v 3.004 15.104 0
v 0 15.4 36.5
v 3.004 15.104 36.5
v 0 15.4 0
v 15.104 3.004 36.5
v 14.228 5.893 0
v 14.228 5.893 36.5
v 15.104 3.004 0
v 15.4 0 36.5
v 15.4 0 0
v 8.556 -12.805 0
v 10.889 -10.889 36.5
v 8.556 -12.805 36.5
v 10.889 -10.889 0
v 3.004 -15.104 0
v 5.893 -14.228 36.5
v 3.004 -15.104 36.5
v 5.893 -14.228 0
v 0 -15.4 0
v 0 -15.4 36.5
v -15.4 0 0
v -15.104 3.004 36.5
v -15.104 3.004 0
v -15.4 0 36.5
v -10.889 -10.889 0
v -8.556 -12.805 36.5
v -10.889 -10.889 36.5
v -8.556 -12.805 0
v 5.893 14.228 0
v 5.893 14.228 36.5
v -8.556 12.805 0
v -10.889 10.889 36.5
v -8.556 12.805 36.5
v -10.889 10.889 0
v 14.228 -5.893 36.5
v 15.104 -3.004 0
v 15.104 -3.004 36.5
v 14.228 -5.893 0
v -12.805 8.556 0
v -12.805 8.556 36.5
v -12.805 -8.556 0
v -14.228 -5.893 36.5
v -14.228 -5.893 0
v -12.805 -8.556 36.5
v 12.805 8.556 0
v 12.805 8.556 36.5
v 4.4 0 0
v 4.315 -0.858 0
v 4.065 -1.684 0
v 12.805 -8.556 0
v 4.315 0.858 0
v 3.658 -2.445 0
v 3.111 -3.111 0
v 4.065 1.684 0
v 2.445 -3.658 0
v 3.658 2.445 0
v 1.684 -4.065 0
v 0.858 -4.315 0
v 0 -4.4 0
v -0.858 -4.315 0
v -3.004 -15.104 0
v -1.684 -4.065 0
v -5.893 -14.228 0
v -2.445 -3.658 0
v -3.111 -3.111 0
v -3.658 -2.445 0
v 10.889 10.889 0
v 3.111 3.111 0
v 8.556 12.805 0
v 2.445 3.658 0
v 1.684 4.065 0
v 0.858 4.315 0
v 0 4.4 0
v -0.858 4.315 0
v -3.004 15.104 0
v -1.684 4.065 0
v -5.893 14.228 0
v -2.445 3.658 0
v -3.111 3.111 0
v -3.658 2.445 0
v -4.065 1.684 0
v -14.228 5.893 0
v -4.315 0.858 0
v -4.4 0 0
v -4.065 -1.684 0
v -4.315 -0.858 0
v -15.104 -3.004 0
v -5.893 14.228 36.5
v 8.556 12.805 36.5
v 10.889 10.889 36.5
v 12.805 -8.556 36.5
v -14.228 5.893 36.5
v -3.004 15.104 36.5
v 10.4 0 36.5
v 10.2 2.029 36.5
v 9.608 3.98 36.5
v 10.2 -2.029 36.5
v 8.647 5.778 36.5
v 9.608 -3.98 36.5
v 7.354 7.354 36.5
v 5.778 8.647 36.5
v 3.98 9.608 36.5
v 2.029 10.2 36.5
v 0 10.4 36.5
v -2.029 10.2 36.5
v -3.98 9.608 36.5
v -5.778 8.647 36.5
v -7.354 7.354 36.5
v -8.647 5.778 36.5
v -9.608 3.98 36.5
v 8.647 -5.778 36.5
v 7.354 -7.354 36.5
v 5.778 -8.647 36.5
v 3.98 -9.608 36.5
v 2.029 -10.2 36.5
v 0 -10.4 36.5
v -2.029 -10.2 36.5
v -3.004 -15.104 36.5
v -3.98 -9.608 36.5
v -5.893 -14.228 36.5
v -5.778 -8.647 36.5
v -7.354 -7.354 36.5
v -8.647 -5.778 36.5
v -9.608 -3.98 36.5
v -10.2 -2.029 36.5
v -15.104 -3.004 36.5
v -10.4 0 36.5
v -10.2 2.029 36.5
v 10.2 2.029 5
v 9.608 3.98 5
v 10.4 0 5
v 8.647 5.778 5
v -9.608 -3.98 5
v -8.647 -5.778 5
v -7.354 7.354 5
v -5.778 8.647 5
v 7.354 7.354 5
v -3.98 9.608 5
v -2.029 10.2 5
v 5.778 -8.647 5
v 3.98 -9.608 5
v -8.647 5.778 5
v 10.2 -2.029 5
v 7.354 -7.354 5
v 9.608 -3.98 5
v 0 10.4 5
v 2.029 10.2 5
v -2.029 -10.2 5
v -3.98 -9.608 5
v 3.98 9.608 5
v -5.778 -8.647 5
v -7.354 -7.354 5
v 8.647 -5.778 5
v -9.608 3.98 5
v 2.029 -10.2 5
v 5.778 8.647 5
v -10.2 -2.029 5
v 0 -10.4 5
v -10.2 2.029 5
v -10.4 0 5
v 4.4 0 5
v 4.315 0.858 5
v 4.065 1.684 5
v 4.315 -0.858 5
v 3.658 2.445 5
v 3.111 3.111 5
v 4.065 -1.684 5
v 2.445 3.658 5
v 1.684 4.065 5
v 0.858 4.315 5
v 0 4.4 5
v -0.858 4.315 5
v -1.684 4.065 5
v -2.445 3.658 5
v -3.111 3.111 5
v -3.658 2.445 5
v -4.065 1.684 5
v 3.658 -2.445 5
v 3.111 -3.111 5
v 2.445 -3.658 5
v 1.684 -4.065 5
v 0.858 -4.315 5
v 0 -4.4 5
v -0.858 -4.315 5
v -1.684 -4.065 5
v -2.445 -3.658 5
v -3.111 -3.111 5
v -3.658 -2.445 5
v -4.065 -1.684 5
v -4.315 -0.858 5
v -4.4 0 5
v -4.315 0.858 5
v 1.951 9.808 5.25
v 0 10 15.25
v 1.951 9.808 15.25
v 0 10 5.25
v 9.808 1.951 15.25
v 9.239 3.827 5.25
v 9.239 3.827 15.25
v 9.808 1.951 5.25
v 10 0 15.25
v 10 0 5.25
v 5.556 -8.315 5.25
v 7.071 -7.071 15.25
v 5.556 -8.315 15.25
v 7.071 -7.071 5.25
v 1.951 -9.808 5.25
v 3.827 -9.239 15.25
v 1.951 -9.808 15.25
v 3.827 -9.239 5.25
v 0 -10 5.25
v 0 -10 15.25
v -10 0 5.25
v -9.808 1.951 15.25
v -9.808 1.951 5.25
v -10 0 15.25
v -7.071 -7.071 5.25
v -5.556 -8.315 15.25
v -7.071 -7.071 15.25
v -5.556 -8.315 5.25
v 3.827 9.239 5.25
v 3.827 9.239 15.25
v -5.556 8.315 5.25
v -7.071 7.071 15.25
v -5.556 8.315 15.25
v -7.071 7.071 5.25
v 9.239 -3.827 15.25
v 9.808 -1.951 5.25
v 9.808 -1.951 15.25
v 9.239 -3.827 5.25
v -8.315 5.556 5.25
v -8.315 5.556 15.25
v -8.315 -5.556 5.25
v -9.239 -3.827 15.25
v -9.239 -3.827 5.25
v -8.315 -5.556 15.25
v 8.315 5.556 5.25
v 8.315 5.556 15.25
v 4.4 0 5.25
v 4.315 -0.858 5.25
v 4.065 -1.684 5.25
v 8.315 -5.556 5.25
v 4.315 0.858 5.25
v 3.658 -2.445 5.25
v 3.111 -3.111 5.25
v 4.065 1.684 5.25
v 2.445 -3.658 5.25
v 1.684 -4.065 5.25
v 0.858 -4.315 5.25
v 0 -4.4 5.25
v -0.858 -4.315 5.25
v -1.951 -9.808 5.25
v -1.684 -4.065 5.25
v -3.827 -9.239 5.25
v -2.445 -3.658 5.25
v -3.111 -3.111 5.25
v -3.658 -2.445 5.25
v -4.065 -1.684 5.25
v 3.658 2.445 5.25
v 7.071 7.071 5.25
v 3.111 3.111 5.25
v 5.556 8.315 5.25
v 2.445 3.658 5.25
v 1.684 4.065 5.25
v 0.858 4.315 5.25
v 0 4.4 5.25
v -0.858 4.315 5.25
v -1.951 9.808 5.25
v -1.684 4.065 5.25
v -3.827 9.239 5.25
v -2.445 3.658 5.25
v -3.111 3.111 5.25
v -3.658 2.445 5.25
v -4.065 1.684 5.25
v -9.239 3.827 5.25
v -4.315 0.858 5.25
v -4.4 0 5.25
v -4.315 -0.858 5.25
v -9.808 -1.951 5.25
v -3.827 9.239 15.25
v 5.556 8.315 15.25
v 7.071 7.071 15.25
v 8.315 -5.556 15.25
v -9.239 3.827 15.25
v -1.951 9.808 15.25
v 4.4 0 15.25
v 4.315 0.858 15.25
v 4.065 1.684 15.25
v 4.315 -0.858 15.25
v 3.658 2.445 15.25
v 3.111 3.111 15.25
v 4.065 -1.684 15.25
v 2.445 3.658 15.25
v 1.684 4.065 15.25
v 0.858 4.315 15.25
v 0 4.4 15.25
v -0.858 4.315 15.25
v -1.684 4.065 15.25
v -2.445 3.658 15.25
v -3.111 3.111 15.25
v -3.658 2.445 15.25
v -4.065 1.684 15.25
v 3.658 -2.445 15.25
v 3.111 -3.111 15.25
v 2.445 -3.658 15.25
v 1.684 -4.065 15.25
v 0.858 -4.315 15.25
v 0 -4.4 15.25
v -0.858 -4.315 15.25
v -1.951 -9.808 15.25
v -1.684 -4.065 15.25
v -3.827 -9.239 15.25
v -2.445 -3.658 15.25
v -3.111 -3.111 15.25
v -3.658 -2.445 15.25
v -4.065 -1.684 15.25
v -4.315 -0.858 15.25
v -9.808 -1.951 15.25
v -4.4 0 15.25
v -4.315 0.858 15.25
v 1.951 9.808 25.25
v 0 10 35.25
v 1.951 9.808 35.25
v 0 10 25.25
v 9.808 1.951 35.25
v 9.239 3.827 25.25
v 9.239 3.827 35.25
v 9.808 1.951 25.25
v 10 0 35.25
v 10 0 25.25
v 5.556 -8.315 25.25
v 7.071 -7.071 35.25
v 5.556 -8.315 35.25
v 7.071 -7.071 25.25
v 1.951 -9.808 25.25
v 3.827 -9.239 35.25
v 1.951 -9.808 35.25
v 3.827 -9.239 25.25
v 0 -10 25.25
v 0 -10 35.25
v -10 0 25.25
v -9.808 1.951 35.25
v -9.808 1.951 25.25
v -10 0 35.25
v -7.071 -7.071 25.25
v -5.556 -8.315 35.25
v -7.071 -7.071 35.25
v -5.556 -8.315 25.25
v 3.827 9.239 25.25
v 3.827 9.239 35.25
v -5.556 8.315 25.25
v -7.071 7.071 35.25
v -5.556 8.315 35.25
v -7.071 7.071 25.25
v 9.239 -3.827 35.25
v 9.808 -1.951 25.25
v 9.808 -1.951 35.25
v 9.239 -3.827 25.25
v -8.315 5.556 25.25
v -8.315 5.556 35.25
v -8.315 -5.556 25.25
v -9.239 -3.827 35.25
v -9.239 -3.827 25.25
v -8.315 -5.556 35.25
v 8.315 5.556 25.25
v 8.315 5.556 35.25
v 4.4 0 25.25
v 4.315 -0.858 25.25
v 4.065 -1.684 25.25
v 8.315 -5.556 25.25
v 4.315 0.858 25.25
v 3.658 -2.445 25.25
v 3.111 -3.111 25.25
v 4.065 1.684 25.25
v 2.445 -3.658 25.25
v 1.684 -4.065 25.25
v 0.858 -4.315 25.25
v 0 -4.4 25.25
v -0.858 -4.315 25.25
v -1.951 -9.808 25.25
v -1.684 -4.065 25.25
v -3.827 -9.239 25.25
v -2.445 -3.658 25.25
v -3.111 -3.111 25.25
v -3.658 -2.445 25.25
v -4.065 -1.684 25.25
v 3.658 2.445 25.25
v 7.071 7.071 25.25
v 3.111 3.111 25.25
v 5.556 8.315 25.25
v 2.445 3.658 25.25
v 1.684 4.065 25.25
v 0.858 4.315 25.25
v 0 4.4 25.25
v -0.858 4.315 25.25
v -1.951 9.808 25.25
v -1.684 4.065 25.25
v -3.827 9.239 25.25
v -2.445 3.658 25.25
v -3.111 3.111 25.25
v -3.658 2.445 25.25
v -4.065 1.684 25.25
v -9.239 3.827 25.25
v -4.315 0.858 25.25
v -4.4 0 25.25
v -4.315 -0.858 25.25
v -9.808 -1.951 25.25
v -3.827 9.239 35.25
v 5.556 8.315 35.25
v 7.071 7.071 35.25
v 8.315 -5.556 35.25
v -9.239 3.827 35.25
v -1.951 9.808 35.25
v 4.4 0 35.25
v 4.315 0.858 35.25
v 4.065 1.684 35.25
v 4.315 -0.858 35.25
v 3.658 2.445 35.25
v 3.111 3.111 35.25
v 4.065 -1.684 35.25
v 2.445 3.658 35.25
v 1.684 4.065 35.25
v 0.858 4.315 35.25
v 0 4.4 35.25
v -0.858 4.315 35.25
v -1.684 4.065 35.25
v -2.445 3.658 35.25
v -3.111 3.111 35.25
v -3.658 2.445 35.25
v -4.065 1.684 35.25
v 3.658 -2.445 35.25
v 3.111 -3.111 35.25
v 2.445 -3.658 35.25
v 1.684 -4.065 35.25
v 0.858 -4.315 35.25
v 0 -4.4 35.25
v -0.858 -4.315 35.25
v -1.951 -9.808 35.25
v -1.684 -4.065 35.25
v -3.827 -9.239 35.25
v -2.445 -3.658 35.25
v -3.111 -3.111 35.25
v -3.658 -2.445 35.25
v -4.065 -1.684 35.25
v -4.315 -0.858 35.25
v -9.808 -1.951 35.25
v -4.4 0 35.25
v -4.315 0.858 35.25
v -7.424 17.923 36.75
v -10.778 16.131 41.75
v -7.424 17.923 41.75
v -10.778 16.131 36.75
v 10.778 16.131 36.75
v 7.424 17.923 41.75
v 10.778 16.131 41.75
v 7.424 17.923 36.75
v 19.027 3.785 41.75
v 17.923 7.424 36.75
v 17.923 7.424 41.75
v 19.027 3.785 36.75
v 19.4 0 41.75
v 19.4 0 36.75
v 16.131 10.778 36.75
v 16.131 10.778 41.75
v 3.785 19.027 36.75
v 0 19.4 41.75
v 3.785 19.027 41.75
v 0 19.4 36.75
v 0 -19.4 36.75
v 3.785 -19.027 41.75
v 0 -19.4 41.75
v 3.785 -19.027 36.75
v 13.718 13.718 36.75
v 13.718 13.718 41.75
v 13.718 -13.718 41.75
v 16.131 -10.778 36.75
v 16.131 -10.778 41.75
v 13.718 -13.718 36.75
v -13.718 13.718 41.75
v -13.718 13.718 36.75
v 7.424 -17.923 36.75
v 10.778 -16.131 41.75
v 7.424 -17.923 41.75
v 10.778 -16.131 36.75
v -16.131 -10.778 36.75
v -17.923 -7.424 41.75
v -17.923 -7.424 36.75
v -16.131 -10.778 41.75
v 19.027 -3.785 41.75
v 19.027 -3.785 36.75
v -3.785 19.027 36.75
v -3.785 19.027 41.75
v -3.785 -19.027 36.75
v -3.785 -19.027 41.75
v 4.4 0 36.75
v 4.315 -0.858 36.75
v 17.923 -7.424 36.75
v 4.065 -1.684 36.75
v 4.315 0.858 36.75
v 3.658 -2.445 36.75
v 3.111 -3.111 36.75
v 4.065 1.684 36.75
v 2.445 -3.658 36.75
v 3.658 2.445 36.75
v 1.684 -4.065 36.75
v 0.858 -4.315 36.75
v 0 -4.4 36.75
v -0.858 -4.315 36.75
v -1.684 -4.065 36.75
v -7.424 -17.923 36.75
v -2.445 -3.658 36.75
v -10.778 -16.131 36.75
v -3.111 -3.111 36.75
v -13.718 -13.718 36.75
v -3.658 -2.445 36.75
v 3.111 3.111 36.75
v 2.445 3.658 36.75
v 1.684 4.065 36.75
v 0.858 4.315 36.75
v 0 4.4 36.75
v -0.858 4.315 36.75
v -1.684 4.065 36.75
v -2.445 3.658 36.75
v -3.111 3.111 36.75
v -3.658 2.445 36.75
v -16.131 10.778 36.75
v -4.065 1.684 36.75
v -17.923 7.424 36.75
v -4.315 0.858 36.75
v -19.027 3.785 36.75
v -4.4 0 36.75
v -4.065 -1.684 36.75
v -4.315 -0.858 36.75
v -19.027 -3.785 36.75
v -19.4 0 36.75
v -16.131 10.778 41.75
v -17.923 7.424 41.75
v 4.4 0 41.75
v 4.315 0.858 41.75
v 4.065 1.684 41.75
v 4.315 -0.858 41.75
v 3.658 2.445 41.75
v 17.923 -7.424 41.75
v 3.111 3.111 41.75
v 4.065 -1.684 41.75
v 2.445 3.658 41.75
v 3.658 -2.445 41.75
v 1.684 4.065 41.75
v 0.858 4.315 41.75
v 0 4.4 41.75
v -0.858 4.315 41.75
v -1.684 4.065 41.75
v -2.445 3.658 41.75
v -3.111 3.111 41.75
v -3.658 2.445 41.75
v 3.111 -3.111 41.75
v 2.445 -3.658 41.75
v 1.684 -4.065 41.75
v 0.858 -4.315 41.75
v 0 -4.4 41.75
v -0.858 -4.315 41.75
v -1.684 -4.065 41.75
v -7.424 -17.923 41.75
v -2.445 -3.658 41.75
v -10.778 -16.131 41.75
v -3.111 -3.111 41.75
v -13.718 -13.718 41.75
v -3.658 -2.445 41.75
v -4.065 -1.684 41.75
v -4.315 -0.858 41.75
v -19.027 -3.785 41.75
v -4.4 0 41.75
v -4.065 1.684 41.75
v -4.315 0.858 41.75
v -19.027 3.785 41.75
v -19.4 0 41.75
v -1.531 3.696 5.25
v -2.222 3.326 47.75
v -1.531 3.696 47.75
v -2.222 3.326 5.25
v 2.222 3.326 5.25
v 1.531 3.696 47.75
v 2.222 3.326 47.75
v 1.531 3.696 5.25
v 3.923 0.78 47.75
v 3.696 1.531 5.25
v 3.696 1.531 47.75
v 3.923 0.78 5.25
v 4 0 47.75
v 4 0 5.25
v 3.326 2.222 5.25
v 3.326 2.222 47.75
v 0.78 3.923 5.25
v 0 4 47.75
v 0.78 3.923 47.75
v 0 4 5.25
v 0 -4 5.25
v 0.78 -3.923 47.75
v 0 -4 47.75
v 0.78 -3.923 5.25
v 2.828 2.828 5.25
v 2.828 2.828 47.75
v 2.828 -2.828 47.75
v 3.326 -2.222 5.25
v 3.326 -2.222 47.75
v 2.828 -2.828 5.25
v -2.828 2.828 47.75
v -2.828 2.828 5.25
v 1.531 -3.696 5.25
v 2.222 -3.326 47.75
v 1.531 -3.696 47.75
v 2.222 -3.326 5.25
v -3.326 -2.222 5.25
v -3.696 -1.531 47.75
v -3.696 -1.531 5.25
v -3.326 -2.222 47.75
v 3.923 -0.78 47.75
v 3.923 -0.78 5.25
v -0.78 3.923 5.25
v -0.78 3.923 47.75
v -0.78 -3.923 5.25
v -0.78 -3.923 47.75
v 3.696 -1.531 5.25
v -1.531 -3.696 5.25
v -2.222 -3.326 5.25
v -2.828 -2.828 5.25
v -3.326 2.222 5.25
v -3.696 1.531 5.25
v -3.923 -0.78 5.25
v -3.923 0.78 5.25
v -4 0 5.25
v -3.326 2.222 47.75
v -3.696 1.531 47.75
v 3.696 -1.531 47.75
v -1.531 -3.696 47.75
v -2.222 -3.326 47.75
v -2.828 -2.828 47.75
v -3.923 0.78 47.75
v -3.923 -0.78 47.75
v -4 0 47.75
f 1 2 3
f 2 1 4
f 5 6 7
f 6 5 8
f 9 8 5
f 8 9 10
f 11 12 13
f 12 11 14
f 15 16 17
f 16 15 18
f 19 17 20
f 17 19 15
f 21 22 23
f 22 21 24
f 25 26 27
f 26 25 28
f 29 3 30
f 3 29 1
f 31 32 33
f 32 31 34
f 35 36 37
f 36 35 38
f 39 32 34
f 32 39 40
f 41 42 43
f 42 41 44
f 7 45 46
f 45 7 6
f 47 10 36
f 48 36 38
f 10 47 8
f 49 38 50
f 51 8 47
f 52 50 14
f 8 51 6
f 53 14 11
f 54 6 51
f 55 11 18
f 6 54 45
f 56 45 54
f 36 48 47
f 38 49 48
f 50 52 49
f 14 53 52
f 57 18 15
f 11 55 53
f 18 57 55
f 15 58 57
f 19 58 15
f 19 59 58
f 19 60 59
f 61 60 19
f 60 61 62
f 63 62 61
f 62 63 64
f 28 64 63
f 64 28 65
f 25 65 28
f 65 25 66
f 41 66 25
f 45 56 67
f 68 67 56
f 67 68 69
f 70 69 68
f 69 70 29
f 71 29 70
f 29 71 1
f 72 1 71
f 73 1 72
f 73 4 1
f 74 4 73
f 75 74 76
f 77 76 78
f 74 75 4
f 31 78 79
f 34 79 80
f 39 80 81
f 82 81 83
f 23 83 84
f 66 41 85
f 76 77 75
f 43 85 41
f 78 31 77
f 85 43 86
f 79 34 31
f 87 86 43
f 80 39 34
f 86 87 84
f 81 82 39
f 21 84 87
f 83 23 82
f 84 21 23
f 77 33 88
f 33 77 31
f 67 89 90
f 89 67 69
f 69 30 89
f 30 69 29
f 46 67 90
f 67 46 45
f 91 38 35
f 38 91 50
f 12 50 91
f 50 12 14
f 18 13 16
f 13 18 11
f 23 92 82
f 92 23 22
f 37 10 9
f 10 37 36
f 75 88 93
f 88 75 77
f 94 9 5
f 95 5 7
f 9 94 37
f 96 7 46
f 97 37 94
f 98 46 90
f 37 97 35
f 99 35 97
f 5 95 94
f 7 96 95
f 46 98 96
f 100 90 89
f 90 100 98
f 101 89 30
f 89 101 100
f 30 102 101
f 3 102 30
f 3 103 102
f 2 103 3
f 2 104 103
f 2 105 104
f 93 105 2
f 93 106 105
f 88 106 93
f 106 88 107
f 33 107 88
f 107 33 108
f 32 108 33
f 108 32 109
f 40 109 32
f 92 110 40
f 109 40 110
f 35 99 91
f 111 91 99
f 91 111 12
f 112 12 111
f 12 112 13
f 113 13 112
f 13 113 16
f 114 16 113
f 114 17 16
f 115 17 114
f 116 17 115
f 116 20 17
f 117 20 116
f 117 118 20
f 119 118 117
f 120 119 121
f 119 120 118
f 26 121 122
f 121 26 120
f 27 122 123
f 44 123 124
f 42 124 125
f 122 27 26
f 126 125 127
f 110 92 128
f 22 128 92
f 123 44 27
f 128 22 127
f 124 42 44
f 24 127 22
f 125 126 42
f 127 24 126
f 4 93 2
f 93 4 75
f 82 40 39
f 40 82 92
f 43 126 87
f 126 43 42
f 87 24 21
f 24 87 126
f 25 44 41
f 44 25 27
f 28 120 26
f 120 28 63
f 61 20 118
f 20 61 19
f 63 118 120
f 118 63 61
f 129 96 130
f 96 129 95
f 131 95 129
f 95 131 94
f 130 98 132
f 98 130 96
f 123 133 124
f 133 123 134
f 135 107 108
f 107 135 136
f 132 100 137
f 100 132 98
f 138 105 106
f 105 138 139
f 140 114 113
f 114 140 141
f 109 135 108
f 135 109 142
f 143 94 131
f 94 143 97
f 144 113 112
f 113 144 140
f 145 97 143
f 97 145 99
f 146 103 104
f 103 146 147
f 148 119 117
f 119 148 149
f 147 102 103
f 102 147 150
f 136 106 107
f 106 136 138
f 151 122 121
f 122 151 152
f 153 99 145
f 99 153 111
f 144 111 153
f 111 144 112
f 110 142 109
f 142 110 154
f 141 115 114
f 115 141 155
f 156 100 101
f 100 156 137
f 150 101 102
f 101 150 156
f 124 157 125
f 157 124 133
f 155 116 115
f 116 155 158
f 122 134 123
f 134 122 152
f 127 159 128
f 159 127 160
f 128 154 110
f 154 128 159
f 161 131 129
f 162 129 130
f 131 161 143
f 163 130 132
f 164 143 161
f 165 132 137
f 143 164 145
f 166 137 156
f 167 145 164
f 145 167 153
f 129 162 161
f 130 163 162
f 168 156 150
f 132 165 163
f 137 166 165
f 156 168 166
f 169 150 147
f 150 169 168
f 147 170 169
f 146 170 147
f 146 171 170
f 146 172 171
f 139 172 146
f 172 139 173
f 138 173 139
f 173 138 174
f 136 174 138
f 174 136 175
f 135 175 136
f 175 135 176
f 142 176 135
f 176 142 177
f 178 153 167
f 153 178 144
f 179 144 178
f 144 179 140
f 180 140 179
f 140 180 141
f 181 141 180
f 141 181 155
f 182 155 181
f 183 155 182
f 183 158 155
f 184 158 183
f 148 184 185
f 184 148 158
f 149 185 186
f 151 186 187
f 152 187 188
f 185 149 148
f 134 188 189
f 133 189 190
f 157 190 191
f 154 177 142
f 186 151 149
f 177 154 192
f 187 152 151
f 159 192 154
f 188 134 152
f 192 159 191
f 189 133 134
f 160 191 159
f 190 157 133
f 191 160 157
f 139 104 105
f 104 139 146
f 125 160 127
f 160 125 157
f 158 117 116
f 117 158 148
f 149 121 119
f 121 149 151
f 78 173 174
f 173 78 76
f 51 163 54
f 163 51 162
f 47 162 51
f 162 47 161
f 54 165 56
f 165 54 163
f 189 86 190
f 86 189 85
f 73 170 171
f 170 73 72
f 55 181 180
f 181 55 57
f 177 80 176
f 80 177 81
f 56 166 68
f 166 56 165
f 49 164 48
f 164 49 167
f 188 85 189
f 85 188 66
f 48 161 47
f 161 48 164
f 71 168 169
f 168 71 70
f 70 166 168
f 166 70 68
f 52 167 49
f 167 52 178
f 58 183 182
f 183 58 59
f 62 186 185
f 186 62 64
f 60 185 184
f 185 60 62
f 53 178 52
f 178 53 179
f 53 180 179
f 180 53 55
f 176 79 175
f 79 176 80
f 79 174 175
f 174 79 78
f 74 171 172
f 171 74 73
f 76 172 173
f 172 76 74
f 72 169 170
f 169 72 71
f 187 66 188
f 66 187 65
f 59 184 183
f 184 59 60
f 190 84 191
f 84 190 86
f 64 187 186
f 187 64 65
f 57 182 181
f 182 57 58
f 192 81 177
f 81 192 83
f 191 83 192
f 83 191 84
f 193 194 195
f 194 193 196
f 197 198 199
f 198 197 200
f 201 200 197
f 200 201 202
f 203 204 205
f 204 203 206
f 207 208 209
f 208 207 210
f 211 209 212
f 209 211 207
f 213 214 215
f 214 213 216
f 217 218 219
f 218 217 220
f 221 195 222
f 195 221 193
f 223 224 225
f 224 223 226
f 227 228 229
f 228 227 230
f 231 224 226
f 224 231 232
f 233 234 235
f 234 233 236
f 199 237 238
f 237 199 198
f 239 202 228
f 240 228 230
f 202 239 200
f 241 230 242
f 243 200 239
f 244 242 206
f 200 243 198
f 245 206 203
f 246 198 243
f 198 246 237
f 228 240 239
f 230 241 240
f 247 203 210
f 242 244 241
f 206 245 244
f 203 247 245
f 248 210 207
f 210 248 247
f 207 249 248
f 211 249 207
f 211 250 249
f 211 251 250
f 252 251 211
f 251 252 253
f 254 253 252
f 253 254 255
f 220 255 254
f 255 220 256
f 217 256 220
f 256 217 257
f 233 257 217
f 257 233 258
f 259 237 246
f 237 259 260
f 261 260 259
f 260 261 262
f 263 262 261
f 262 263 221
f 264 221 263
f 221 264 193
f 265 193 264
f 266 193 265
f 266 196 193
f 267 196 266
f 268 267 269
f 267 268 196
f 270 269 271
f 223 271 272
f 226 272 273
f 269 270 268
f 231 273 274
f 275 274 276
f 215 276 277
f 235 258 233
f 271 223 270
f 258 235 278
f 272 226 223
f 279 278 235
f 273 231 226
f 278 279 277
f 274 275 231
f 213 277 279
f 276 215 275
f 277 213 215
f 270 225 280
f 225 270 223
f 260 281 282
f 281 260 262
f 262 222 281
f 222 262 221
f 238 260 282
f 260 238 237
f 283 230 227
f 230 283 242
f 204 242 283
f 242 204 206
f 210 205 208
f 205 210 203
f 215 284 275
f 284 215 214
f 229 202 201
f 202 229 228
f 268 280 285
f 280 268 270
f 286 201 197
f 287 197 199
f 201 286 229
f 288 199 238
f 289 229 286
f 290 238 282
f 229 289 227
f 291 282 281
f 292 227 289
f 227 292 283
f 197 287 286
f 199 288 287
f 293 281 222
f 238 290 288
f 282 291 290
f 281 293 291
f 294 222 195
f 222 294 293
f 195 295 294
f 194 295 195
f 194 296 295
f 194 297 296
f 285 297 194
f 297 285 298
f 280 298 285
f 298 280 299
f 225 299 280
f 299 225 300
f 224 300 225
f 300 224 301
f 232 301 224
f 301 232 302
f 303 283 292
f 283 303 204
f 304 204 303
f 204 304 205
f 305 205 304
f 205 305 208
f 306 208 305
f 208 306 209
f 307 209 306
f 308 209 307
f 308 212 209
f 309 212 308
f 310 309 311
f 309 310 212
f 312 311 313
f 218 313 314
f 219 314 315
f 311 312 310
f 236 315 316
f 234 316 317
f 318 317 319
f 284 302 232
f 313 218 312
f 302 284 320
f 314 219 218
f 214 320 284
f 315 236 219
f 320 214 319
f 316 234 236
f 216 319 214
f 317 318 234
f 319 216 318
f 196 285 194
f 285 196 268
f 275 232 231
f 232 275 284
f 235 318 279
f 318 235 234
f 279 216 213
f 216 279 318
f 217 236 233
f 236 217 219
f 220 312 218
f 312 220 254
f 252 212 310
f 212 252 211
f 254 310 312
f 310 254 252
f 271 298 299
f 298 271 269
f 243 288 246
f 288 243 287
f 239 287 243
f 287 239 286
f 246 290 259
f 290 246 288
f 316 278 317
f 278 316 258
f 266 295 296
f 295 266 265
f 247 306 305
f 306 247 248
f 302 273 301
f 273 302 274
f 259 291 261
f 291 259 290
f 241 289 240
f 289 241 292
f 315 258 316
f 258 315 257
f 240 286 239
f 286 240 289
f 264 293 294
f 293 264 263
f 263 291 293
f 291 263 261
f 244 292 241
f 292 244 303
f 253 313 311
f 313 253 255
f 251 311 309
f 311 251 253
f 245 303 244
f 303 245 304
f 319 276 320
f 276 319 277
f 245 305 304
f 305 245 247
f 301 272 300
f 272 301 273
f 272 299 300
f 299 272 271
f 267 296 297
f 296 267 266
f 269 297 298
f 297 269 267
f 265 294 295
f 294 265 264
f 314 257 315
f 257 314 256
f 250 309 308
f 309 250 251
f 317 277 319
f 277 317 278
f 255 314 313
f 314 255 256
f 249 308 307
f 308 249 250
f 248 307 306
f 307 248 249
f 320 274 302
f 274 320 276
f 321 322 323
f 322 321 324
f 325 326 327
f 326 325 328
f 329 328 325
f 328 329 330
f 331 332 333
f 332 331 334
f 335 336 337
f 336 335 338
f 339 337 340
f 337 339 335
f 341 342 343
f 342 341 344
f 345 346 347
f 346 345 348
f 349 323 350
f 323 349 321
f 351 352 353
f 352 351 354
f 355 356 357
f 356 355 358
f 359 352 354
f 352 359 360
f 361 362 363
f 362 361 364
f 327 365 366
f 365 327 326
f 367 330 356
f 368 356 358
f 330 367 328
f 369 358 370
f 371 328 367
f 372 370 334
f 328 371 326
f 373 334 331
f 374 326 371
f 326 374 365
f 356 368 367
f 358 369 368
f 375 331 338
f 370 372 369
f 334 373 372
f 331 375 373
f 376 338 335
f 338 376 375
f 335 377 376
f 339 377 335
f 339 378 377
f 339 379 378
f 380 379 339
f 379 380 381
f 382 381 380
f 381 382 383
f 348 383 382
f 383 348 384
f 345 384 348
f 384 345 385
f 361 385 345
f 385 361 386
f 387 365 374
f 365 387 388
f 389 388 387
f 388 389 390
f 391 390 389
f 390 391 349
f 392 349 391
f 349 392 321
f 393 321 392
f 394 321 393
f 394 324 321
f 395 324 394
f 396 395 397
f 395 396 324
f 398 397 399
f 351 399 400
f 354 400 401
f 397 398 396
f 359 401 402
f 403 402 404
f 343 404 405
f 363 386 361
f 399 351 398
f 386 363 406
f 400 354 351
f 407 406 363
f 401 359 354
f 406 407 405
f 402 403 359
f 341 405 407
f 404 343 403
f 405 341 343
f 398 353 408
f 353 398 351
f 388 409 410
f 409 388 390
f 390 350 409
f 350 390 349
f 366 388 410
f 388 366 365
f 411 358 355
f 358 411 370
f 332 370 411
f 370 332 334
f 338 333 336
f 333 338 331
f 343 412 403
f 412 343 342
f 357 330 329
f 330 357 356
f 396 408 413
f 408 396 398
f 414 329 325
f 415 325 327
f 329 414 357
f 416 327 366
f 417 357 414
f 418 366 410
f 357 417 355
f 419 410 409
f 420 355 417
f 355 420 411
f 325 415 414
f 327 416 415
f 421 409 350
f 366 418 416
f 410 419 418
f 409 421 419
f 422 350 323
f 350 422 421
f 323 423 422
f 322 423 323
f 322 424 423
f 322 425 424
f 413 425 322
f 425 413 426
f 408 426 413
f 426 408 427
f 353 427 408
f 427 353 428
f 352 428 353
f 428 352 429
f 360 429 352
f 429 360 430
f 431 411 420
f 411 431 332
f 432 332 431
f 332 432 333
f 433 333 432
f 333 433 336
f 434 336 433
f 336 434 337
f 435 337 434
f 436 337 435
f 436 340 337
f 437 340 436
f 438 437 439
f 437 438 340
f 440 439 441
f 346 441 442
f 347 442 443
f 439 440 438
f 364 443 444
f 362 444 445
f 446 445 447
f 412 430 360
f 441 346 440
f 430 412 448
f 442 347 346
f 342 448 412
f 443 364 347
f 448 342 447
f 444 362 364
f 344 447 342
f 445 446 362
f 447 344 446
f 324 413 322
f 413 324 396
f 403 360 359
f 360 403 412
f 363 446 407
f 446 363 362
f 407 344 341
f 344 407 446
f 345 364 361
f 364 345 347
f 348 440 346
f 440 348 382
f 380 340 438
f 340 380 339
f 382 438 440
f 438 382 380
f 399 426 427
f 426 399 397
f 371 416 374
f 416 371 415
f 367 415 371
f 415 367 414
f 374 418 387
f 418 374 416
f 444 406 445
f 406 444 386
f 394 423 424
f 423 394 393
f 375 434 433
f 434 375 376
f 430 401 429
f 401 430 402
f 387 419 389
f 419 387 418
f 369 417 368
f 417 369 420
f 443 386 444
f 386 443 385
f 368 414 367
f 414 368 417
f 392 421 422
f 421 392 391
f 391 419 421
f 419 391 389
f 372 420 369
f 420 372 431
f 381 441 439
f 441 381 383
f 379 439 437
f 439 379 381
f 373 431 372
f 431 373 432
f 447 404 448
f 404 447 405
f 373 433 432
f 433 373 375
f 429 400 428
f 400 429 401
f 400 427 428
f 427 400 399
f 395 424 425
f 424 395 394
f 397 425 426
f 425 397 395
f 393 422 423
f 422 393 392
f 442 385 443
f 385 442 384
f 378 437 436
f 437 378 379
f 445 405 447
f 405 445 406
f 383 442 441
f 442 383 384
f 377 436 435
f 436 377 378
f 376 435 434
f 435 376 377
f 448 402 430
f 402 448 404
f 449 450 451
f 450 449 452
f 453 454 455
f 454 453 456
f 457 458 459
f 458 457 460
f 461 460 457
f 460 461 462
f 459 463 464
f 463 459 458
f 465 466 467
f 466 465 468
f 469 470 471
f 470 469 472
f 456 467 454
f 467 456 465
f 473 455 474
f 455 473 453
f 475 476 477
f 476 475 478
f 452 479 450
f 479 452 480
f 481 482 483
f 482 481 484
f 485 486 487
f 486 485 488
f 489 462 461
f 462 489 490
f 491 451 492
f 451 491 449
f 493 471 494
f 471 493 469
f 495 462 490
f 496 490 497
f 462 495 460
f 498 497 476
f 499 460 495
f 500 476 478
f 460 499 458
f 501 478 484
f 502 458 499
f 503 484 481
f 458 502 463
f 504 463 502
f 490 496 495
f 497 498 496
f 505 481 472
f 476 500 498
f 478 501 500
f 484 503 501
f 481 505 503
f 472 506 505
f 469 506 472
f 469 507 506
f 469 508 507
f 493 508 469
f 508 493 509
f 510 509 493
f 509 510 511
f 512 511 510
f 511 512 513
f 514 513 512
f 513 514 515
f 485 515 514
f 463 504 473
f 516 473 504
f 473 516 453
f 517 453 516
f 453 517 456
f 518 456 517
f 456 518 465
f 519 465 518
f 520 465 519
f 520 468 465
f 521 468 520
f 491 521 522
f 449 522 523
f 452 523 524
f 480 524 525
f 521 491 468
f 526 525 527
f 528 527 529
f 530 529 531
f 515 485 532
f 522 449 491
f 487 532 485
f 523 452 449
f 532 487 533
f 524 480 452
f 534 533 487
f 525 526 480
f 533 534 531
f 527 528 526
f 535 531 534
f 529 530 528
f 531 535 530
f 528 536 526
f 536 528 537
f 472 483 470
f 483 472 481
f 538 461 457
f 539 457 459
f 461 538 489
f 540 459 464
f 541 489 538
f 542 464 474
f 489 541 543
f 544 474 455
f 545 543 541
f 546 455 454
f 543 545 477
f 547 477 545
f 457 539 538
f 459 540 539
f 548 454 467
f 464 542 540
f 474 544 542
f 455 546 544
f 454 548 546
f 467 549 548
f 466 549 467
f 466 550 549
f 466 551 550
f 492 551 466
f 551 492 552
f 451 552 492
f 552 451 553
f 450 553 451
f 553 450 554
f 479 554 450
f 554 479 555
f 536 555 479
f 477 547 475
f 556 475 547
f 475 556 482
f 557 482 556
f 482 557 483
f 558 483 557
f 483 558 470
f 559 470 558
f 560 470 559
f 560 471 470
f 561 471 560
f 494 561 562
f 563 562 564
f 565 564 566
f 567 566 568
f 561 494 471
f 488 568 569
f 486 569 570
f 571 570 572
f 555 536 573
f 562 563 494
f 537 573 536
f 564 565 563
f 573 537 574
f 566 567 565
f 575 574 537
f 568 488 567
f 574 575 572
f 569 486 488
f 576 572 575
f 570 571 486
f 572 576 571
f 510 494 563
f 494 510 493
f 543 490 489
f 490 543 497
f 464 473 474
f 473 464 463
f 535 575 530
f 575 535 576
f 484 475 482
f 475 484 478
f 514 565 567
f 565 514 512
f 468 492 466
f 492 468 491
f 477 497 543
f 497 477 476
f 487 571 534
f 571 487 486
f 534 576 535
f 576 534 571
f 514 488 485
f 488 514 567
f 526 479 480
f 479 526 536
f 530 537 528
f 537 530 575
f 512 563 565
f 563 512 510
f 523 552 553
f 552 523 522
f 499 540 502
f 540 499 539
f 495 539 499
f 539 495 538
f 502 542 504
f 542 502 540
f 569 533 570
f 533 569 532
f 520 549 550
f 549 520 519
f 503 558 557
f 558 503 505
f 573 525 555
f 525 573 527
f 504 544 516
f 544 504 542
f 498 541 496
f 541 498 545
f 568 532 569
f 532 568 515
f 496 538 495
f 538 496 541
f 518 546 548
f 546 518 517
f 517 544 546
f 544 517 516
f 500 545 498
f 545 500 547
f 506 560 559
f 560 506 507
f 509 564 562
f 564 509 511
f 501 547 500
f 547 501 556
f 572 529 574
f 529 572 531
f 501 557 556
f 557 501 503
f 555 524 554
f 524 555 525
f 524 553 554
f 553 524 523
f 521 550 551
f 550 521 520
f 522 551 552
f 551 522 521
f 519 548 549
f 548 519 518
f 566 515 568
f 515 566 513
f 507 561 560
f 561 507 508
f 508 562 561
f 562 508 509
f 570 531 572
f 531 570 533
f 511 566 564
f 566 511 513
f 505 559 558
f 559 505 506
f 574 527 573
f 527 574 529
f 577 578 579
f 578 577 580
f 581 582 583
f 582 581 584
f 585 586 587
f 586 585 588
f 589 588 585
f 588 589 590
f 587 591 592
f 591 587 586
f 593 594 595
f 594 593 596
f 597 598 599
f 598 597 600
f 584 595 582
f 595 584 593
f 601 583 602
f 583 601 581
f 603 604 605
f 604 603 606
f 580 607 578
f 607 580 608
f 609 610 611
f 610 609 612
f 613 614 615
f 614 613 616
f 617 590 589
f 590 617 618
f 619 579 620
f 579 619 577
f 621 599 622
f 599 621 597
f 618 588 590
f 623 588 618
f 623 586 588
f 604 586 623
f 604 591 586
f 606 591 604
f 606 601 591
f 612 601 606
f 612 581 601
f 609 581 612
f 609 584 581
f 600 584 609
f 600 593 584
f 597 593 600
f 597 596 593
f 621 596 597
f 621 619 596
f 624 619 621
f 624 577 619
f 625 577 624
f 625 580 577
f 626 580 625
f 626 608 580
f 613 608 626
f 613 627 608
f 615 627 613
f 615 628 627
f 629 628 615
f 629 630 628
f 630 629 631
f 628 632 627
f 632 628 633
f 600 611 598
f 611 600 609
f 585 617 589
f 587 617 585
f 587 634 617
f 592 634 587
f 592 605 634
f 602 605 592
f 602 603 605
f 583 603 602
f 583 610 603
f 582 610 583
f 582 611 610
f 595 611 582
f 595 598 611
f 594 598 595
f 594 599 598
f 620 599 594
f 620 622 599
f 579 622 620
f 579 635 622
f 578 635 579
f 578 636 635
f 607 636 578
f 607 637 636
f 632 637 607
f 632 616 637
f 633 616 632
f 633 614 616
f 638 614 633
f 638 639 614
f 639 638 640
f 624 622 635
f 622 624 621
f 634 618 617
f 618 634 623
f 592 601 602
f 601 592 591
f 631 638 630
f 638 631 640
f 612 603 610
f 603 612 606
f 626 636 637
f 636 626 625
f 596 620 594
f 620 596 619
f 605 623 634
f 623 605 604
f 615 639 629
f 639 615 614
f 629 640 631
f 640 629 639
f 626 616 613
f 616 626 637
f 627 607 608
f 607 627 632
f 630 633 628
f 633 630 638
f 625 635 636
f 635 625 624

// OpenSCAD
$fn = 32;

// ------------------------------------------------------------------------
// Shaft station: cup d30.8 x 36.5 mm, shaft d8
// Every part is its own module, assembly() places every instance.
// ------------------------------------------------------------------------

// --- part 1 ---
module housing_cup() {
  difference() {
    cylinder(h = 36.5, d = 30.8);
    translate([0, 0, 5]) cylinder(h = 32.5, d = 20.8);
    translate([0, 0, -1]) cylinder(h = 7, d = 8.8);
  }
}

// --- part 2 ---
module bearing_lower() {
  difference() {
      translate([0, 0, 0]) cylinder(h = 10, d = 20);
      translate([0, 0, -1]) cylinder(h = 12, d = 8.8);
    }
}

// --- part 3 ---
module bearing_upper() {
  difference() {
      translate([0, 0, 0]) cylinder(h = 10, d = 20);
      translate([0, 0, -1]) cylinder(h = 12, d = 8.8);
    }
}

// --- part 4 ---
module station_shaft() {
  translate([0, 0, -21.25]) cylinder(h = 42.5, d = 8);
}

// --- part 5 ---
module station_cover() {
  difference() {
    cylinder(h = 5, d = 38.8);
    translate([0, 0, -1]) cylinder(h = 7, d = 8.8);
  }
}

// --- assembly ---
module assembly() {
  color([0.80, 0.24, 0.20]) translate([0, 0, 0]) rotate([0, 0, 0]) housing_cup();
  color([0.20, 0.45, 0.75]) translate([0, 0, 5.25]) rotate([0, 0, 0]) bearing_lower();
  color([0.25, 0.62, 0.32]) translate([0, 0, 25.25]) rotate([0, 0, 0]) bearing_upper();
  color([0.92, 0.70, 0.18]) translate([0, 0, 26.5]) rotate([0, 0, 0]) station_shaft();
  color([0.58, 0.35, 0.70]) translate([0, 0, 36.75]) rotate([0, 0, 0]) station_cover();
}

assembly();
